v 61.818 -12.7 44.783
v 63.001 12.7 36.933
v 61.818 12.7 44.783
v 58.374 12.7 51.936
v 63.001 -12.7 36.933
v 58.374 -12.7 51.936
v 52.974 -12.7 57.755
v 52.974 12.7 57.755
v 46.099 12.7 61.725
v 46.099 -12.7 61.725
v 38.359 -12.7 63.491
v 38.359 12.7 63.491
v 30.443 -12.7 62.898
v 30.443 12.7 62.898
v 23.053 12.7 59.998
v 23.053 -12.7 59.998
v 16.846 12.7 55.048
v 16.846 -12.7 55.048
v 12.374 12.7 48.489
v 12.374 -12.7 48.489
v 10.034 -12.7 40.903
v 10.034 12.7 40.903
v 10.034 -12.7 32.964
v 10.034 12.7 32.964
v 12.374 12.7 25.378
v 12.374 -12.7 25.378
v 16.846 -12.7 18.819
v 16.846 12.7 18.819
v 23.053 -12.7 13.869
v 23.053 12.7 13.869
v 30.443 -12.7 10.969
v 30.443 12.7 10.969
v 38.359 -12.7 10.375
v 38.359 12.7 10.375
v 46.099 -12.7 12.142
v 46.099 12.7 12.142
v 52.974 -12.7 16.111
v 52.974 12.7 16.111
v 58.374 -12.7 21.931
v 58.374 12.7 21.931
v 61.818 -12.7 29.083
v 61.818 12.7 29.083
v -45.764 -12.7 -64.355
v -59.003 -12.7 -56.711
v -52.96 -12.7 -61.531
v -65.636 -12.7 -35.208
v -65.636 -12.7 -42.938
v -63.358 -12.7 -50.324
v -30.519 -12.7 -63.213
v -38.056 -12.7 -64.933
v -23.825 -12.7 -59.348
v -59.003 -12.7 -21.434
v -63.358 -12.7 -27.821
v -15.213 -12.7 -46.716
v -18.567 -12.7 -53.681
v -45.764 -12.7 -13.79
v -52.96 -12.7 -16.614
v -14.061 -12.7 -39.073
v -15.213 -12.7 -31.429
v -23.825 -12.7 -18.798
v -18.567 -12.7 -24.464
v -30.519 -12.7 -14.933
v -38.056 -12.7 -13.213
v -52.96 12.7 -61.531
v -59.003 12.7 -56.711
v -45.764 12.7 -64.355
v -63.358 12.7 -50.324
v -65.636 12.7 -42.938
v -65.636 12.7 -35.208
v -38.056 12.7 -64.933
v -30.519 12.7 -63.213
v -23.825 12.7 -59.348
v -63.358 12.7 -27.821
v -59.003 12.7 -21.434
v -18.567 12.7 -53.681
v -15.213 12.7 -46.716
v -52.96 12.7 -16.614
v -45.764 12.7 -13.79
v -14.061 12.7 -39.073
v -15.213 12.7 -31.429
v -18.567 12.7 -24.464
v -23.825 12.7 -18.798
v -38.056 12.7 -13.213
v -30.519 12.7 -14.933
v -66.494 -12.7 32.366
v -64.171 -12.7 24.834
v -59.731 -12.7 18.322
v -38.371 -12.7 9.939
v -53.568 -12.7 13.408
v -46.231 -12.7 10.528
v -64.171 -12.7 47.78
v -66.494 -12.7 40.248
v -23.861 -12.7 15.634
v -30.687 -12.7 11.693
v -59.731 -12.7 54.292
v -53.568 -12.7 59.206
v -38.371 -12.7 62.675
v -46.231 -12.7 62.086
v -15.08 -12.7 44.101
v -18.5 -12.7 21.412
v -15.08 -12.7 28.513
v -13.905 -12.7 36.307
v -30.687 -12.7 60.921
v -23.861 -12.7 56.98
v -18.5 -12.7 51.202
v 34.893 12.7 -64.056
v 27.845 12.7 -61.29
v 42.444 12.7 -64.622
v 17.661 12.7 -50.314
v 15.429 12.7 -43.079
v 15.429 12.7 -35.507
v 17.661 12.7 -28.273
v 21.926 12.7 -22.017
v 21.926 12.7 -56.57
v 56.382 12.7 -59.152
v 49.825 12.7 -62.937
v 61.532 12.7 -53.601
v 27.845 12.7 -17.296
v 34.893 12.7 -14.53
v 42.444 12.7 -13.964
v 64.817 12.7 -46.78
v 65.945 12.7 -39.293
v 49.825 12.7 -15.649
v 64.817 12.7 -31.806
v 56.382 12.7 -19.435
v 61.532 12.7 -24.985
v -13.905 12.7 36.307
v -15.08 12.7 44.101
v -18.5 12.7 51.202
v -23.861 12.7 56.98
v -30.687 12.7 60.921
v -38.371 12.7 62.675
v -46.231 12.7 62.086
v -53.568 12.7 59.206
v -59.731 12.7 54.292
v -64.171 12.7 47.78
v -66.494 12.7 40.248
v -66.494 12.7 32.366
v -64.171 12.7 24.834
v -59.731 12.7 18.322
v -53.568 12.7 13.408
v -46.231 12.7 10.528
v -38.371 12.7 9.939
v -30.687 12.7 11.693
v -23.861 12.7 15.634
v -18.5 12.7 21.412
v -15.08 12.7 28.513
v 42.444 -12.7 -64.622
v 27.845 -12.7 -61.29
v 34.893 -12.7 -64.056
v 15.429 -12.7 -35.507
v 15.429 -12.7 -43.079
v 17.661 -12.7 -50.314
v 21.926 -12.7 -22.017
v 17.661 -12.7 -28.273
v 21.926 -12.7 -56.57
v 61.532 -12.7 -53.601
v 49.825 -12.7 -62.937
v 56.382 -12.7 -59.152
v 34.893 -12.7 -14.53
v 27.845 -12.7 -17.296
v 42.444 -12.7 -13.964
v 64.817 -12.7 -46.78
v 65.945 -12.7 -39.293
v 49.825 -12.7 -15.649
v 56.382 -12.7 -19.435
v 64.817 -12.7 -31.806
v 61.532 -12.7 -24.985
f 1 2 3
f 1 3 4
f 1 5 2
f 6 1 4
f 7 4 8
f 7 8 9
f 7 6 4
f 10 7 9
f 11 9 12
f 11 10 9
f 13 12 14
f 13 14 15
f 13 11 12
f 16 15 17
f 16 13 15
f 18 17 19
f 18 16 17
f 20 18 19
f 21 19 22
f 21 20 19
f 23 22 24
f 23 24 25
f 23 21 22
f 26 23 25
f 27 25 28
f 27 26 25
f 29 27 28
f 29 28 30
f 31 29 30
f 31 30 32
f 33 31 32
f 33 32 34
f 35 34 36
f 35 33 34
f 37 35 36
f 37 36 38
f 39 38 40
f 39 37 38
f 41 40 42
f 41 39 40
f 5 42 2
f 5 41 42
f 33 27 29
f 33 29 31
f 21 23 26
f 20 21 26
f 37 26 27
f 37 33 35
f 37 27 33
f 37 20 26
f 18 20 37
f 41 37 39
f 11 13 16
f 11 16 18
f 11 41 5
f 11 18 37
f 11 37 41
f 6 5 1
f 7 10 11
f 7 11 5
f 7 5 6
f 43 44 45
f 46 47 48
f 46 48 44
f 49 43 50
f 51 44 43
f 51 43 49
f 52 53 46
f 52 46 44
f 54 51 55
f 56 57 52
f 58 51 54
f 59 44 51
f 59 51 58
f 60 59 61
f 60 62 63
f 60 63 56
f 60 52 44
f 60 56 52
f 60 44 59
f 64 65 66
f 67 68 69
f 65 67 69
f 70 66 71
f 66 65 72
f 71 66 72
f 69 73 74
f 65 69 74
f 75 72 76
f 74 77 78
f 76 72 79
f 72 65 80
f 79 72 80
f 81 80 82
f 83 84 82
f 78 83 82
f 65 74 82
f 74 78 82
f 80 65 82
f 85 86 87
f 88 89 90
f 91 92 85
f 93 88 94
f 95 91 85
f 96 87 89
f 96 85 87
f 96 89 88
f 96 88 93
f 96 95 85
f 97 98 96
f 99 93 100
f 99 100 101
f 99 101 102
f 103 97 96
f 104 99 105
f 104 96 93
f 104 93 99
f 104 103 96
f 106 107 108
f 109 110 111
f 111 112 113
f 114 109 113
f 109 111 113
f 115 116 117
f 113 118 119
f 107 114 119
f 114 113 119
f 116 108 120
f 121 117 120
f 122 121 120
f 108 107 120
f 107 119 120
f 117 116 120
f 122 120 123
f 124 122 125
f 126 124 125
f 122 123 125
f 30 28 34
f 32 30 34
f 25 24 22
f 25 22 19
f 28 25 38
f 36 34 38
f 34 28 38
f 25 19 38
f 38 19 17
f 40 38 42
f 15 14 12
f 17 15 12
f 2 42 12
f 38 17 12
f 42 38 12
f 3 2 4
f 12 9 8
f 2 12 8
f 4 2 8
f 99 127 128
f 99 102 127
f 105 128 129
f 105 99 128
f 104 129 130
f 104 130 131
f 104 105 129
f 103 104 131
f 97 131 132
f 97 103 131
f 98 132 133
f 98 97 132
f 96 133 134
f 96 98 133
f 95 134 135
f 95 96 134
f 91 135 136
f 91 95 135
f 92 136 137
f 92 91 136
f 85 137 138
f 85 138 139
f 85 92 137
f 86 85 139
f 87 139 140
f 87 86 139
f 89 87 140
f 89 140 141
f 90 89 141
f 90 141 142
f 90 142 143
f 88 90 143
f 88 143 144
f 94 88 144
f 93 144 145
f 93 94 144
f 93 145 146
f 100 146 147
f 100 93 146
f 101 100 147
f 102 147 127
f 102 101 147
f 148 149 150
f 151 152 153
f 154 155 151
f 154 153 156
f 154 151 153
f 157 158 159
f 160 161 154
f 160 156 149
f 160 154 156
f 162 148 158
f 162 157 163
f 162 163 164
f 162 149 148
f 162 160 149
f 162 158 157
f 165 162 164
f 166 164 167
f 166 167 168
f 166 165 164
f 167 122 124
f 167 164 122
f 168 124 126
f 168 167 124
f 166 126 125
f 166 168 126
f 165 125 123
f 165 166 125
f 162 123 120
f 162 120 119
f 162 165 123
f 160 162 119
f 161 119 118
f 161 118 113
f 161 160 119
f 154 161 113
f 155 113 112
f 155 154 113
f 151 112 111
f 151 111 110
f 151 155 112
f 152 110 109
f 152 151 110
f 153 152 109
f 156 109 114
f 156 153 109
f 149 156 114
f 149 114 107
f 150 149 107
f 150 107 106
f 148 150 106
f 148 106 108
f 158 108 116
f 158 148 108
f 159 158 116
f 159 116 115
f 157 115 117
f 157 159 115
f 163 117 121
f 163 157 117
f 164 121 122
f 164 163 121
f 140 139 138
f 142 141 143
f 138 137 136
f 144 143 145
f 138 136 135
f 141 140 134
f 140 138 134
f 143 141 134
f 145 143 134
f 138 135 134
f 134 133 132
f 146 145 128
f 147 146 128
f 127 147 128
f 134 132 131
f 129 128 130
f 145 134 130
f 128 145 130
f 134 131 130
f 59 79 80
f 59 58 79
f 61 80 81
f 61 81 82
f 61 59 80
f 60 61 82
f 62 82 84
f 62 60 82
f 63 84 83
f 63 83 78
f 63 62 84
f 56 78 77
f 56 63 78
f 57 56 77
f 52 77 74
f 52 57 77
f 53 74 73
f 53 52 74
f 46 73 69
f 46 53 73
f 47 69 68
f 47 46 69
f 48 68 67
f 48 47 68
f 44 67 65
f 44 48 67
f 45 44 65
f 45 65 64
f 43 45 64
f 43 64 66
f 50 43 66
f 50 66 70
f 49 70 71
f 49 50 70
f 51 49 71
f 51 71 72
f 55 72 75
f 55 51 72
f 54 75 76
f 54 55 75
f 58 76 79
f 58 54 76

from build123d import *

# Parameters (mm, degrees)
F0_R          = 26.441884
F0_R_2        = 26.632414
F0_R_3        = 25.932532
F0_R_4        = 25.4
F1_DEPTH      = 12.7
F1_DEPTH_BACK = 12.7


with BuildPart() as f1:
    # F0 (on Front) → F1 (new body, two sides)
    with BuildSketch(Plane.XZ) as f1_sk:
        with Locations((-40.347241, 36.307007)):
            Circle(F0_R)
        with Locations((36.369018, 36.933262)):
            Circle(F0_R_2)
        with Locations((-39.993554, -39.072676)):
            Circle(F0_R_3)
        with Locations((40.545486, -39.29317)):
            Circle(F0_R_4)
    extrude(amount=F1_DEPTH)
    extrude(f1_sk.sketch, amount=-F1_DEPTH_BACK)


solid = f1.part
